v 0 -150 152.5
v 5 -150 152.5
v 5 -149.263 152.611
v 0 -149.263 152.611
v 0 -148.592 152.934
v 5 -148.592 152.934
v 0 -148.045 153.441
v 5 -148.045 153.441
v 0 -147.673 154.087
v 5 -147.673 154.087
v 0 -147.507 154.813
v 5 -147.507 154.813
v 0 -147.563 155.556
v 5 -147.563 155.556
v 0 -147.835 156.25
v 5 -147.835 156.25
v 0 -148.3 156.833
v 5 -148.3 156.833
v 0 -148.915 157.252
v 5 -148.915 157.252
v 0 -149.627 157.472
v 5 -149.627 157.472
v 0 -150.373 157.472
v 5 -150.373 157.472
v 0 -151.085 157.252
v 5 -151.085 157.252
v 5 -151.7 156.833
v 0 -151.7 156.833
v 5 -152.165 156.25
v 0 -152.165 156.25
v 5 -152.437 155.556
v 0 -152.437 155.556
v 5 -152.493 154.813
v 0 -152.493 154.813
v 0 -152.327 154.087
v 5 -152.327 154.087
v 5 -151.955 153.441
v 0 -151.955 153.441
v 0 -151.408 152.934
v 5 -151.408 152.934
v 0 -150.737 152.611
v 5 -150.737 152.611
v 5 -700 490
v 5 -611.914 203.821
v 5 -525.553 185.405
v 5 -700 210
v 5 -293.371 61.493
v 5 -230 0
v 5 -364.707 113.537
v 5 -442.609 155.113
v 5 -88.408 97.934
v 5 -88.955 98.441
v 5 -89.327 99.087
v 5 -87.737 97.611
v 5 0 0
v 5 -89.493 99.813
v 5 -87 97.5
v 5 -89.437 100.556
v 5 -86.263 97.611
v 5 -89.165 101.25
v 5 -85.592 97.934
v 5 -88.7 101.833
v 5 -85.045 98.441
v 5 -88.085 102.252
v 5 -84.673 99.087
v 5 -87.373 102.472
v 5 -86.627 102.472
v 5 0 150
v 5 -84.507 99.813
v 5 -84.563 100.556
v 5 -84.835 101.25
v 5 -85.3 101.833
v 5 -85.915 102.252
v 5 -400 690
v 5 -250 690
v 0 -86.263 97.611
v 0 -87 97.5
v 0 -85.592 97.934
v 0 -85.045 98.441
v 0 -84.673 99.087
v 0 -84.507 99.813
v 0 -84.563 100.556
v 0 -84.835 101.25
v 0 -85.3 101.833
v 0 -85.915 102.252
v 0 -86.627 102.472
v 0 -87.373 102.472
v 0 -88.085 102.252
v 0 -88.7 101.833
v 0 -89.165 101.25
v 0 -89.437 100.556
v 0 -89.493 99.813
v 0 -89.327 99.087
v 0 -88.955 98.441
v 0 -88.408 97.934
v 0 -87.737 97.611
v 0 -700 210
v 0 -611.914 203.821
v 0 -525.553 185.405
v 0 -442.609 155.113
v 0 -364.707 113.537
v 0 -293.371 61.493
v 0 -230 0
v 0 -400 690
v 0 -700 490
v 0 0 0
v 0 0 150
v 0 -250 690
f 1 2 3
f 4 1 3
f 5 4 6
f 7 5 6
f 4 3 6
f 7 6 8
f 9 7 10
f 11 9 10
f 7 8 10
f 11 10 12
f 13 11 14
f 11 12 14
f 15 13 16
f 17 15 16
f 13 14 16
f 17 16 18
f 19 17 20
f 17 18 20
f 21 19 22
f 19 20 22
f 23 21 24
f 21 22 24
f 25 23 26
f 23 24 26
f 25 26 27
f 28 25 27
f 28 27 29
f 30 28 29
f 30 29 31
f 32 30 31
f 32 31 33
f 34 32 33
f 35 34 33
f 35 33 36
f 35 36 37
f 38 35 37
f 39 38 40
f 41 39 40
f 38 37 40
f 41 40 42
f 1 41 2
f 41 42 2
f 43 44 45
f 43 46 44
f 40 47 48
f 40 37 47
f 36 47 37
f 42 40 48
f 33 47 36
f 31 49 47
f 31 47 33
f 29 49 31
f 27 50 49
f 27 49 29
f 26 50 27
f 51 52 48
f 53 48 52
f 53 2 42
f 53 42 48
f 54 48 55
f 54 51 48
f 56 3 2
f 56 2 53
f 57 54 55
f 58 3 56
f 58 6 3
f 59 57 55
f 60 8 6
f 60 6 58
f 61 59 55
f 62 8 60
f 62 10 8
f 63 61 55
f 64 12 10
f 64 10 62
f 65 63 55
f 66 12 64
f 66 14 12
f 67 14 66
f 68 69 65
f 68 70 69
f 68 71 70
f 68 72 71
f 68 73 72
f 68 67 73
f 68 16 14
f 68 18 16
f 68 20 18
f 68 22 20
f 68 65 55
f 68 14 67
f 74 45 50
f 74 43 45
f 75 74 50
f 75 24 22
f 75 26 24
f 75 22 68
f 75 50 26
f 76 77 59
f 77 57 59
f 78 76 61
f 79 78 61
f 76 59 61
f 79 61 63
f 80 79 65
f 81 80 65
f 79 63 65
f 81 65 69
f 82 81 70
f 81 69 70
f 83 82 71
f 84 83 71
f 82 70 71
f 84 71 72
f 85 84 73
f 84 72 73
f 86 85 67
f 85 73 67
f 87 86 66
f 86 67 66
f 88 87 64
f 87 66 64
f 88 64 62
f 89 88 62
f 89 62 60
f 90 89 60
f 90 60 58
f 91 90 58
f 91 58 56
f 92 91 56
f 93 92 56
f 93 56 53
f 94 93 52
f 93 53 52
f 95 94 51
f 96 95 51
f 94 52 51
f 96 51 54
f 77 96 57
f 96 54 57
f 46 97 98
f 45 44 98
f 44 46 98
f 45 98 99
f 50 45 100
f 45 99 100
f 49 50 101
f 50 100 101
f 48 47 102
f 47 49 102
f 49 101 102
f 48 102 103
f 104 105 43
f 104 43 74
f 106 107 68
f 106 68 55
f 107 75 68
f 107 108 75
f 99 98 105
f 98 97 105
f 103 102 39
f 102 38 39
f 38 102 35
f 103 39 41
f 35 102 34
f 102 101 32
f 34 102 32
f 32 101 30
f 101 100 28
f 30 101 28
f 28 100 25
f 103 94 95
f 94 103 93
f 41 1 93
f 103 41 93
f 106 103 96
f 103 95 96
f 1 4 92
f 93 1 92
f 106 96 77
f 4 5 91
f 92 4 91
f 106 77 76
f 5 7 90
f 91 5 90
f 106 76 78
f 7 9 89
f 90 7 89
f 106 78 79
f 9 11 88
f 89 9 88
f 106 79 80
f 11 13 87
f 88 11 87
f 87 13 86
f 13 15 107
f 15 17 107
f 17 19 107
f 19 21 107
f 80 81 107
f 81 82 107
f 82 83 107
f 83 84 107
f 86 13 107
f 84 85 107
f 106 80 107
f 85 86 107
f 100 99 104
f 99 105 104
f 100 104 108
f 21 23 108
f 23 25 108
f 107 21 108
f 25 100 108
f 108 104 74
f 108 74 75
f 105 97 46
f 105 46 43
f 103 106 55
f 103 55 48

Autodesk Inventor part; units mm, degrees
ref_plane "YZ Plane" through (0, 0, 0) normal (1, 0, 0) x (0, 1, 0)
ref_plane "XZ Plane" through (0, 0, 0) normal (0, 1, 0) x (-1, 0, 0)
ref_plane "XY Plane" through (0, 0, 0) normal (0, 0, 1) x (1, 0, 0)
sketch "スケッチ1" plane through (0, 0, 0) normal (1, 0, 0) x (0, 1, 0)
  line L0 (-700, 210) -> (-700, 490)
  line L1 (-700, 490) -> (-400, 690)
  line L2 (-400, 690) -> (-250, 690)
  line L3 (-250, 690) -> (0, 150)
  line L4 (0, 150) -> (0, 0)
  line L5 (0, 0) -> (-230, 0)
  arc A0 (-230, 0) -> (-700, 210) centre (-700, -420.9524) ccw
  dimension "d0" = 690
  dimension "d1" = 280
  dimension "d2" = 200
  dimension "d3" = 300
  dimension "d4" = 150
  dimension "d5" = 700
  dimension "d6" = 230
  dimension "d7" = 150
extrude "押し出し1" add sketch "スケッチ1" along normal blind 5
sketch "スケッチ2" plane through (5, 0, 0) normal (1, 0, 0) x (0, 0, -1)
  circle A0 centre (-100, -87) radius 2.5
  line L0 (0, 0) -> (-150, 0) projected
  line L1 (0, -230) -> (0, 0) projected
  circle A1 centre (-155, -150) radius 2.5
  dimension "d10" = 87
  dimension "d11" = 100
  dimension "d12" = 5
  dimension "d13" = 150
  dimension "d14" = 155
  dimension "d15" = 5
extrude "押し出し2" cut sketch "スケッチ2" against normal through all
properties part number "end_plate" material "CFRP"
